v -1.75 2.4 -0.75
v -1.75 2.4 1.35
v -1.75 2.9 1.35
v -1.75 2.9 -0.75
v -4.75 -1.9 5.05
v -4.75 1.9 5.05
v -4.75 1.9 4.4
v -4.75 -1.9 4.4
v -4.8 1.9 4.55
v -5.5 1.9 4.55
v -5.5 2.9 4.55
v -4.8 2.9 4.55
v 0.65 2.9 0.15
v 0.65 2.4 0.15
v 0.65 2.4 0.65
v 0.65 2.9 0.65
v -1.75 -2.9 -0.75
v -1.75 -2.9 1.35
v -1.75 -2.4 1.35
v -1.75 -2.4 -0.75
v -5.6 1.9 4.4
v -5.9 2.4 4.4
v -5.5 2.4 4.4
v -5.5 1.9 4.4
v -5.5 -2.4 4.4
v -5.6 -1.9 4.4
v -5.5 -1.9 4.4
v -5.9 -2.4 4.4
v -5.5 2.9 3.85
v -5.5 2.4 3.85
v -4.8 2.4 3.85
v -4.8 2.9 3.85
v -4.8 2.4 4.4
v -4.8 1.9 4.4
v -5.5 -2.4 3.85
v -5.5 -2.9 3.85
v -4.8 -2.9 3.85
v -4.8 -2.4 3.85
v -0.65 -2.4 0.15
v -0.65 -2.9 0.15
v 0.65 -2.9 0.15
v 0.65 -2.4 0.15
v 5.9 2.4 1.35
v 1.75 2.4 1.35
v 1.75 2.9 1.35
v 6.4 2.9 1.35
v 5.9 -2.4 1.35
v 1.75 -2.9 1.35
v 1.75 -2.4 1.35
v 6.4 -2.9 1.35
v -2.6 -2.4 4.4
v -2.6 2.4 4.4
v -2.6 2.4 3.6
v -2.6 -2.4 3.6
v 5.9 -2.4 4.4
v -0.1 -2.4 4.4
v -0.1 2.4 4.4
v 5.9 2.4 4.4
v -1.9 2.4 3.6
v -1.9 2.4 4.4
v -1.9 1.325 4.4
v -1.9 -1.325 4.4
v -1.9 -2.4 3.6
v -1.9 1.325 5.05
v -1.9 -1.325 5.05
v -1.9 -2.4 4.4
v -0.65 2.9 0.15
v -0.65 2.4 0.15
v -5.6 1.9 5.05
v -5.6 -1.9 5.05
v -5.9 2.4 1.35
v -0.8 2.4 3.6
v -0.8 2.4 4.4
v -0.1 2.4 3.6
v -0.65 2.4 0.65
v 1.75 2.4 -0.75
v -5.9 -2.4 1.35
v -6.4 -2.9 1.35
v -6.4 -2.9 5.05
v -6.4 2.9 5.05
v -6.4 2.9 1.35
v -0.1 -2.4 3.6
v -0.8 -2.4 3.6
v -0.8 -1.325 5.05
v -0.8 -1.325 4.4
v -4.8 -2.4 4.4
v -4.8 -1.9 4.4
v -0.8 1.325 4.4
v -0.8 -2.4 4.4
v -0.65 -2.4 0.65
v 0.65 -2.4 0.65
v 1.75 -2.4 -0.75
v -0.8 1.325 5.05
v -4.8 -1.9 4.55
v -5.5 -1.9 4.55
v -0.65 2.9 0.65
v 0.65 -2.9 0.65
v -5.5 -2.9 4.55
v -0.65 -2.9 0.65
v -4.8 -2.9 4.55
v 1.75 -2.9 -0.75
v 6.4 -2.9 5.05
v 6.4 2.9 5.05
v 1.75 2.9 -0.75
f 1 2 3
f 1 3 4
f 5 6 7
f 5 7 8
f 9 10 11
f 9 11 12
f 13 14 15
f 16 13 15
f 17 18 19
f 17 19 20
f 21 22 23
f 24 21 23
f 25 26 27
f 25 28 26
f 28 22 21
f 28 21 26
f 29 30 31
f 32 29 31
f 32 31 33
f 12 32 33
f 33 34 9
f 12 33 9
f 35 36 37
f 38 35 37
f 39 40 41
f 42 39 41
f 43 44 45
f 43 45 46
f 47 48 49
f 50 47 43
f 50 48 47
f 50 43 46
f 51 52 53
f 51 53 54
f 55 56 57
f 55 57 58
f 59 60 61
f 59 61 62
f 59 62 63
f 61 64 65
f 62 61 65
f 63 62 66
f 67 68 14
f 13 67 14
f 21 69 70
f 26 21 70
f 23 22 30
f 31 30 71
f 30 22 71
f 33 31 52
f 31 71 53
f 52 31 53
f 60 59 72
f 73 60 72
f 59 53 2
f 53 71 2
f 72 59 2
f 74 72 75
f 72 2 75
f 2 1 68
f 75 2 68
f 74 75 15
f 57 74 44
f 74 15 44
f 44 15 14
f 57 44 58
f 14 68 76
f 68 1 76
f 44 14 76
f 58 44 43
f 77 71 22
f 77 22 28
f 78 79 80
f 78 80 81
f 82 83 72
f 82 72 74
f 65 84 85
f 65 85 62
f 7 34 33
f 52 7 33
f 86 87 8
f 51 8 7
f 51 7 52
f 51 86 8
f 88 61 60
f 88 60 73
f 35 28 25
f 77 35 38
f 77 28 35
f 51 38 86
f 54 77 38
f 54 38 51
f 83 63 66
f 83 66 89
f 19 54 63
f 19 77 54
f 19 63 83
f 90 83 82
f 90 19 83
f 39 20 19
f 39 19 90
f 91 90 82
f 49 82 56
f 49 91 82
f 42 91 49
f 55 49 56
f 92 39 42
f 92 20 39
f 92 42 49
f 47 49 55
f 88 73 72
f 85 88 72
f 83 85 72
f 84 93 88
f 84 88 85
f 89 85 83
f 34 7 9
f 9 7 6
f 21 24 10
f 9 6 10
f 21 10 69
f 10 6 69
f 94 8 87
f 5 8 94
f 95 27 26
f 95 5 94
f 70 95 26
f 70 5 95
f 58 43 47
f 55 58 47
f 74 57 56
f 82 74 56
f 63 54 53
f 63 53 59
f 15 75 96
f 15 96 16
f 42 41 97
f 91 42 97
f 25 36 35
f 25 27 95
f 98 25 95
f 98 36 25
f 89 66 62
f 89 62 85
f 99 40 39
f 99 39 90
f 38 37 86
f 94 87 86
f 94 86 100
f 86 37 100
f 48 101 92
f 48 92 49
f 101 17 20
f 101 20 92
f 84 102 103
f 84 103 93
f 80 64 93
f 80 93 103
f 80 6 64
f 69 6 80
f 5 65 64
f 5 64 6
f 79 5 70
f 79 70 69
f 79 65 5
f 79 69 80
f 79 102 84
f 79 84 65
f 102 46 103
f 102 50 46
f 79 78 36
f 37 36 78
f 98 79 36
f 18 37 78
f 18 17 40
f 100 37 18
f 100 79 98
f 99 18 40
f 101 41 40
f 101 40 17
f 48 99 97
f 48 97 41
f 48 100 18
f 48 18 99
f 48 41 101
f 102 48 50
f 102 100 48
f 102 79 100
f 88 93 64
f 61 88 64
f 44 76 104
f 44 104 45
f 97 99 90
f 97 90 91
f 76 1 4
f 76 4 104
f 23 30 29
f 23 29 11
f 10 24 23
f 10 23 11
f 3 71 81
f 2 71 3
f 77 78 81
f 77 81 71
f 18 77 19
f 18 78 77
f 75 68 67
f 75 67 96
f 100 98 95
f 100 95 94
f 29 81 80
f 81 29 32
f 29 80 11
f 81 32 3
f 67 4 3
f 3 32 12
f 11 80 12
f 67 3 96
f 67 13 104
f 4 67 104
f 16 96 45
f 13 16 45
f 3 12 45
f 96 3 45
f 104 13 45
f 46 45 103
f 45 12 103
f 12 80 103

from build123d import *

# Parameters (mm, degrees)
SKETCH028_W     = 1.3
SKETCH028_H     = 0.5
PAD004_DEPTH    = 2.9
SKETCH035_W     = 11.8
SKETCH035_H     = 4.8
POCKET013_DEPTH = 5.15
SKETCH036_W     = 1.1
SKETCH036_H     = 2.65
POCKET014_DEPTH = 0.65
SKETCH037_W     = 0.7
SKETCH037_H     = 4.8
PAD028_DEPTH    = 0.8
SKETCH038_W     = 0.85
SKETCH038_H     = 3.8
POCKET015_DEPTH = 0.65
SKETCH039_W     = 0.7
SKETCH039_H     = 0.7
POCKET016_DEPTH = 5.801


with BuildPart() as part:
    # Sketch028 → Pad004 (new body, symmetric)
    with BuildSketch(Plane.XZ):
        Polygon((6.4, 1.35), (6.4, 5.05), (-6.4, 5.05), (-6.4, 1.35), (-1.75, 1.35), (-1.75, -0.75), (1.75, -0.75), (1.75, 1.35), align=None)
        with Locations((0, 0.4)):
            Rectangle(SKETCH028_W, SKETCH028_H, mode=Mode.SUBTRACT)
    extrude(amount=PAD004_DEPTH, both=True)

    # Sketch035 (on Face6 of Pad004) → Pocket013 (cut)
    with BuildSketch(Plane(origin=(0, 0, -0.75), x_dir=(1, 0, 0), z_dir=(0, 0, -1))):
        Rectangle(SKETCH035_W, SKETCH035_H)
    extrude(amount=-POCKET013_DEPTH, mode=Mode.SUBTRACT)

    # Sketch036 (on Face3 of Pocket013) → Pocket014 (cut)
    with BuildSketch(Plane(origin=(0, 0, 5.05), x_dir=(-1, 0, 0), z_dir=(0, 0, 1))):
        with Locations((1.35, 0)):
            Rectangle(SKETCH036_W, SKETCH036_H)
    extrude(amount=-POCKET014_DEPTH, mode=Mode.SUBTRACT)

    # Sketch037 (on Face30 of Pocket014) → Pad028 (join)
    with BuildSketch(Plane(origin=(0, 0, 4.4), x_dir=(1, 0, 0), z_dir=(0, 0, -1))):
        with Locations((-2.25, 0)):
            Rectangle(SKETCH037_W, SKETCH037_H)
        with Locations((-0.45, 0)):
            Rectangle(SKETCH037_W, SKETCH037_H)
    extrude(amount=PAD028_DEPTH)

    # Sketch038 (on Face3 of Pad028) → Pocket015 (cut)
    with BuildSketch(Plane(origin=(0, 0, 5.05), x_dir=(-1, 0, 0), z_dir=(0, 0, 1))):
        with Locations((5.175, 0)):
            Rectangle(SKETCH038_W, SKETCH038_H)
    extrude(amount=-POCKET015_DEPTH, mode=Mode.SUBTRACT)

    # Sketch039 (on Face5 of Pocket015) → Pocket016 (cut, through all)
    with BuildSketch(Plane.XZ.offset(2.9)):
        with Locations((-5.15, 4.2)):
            Rectangle(SKETCH039_W, SKETCH039_H)
    extrude(amount=-POCKET016_DEPTH, mode=Mode.SUBTRACT)


solid = part.part
